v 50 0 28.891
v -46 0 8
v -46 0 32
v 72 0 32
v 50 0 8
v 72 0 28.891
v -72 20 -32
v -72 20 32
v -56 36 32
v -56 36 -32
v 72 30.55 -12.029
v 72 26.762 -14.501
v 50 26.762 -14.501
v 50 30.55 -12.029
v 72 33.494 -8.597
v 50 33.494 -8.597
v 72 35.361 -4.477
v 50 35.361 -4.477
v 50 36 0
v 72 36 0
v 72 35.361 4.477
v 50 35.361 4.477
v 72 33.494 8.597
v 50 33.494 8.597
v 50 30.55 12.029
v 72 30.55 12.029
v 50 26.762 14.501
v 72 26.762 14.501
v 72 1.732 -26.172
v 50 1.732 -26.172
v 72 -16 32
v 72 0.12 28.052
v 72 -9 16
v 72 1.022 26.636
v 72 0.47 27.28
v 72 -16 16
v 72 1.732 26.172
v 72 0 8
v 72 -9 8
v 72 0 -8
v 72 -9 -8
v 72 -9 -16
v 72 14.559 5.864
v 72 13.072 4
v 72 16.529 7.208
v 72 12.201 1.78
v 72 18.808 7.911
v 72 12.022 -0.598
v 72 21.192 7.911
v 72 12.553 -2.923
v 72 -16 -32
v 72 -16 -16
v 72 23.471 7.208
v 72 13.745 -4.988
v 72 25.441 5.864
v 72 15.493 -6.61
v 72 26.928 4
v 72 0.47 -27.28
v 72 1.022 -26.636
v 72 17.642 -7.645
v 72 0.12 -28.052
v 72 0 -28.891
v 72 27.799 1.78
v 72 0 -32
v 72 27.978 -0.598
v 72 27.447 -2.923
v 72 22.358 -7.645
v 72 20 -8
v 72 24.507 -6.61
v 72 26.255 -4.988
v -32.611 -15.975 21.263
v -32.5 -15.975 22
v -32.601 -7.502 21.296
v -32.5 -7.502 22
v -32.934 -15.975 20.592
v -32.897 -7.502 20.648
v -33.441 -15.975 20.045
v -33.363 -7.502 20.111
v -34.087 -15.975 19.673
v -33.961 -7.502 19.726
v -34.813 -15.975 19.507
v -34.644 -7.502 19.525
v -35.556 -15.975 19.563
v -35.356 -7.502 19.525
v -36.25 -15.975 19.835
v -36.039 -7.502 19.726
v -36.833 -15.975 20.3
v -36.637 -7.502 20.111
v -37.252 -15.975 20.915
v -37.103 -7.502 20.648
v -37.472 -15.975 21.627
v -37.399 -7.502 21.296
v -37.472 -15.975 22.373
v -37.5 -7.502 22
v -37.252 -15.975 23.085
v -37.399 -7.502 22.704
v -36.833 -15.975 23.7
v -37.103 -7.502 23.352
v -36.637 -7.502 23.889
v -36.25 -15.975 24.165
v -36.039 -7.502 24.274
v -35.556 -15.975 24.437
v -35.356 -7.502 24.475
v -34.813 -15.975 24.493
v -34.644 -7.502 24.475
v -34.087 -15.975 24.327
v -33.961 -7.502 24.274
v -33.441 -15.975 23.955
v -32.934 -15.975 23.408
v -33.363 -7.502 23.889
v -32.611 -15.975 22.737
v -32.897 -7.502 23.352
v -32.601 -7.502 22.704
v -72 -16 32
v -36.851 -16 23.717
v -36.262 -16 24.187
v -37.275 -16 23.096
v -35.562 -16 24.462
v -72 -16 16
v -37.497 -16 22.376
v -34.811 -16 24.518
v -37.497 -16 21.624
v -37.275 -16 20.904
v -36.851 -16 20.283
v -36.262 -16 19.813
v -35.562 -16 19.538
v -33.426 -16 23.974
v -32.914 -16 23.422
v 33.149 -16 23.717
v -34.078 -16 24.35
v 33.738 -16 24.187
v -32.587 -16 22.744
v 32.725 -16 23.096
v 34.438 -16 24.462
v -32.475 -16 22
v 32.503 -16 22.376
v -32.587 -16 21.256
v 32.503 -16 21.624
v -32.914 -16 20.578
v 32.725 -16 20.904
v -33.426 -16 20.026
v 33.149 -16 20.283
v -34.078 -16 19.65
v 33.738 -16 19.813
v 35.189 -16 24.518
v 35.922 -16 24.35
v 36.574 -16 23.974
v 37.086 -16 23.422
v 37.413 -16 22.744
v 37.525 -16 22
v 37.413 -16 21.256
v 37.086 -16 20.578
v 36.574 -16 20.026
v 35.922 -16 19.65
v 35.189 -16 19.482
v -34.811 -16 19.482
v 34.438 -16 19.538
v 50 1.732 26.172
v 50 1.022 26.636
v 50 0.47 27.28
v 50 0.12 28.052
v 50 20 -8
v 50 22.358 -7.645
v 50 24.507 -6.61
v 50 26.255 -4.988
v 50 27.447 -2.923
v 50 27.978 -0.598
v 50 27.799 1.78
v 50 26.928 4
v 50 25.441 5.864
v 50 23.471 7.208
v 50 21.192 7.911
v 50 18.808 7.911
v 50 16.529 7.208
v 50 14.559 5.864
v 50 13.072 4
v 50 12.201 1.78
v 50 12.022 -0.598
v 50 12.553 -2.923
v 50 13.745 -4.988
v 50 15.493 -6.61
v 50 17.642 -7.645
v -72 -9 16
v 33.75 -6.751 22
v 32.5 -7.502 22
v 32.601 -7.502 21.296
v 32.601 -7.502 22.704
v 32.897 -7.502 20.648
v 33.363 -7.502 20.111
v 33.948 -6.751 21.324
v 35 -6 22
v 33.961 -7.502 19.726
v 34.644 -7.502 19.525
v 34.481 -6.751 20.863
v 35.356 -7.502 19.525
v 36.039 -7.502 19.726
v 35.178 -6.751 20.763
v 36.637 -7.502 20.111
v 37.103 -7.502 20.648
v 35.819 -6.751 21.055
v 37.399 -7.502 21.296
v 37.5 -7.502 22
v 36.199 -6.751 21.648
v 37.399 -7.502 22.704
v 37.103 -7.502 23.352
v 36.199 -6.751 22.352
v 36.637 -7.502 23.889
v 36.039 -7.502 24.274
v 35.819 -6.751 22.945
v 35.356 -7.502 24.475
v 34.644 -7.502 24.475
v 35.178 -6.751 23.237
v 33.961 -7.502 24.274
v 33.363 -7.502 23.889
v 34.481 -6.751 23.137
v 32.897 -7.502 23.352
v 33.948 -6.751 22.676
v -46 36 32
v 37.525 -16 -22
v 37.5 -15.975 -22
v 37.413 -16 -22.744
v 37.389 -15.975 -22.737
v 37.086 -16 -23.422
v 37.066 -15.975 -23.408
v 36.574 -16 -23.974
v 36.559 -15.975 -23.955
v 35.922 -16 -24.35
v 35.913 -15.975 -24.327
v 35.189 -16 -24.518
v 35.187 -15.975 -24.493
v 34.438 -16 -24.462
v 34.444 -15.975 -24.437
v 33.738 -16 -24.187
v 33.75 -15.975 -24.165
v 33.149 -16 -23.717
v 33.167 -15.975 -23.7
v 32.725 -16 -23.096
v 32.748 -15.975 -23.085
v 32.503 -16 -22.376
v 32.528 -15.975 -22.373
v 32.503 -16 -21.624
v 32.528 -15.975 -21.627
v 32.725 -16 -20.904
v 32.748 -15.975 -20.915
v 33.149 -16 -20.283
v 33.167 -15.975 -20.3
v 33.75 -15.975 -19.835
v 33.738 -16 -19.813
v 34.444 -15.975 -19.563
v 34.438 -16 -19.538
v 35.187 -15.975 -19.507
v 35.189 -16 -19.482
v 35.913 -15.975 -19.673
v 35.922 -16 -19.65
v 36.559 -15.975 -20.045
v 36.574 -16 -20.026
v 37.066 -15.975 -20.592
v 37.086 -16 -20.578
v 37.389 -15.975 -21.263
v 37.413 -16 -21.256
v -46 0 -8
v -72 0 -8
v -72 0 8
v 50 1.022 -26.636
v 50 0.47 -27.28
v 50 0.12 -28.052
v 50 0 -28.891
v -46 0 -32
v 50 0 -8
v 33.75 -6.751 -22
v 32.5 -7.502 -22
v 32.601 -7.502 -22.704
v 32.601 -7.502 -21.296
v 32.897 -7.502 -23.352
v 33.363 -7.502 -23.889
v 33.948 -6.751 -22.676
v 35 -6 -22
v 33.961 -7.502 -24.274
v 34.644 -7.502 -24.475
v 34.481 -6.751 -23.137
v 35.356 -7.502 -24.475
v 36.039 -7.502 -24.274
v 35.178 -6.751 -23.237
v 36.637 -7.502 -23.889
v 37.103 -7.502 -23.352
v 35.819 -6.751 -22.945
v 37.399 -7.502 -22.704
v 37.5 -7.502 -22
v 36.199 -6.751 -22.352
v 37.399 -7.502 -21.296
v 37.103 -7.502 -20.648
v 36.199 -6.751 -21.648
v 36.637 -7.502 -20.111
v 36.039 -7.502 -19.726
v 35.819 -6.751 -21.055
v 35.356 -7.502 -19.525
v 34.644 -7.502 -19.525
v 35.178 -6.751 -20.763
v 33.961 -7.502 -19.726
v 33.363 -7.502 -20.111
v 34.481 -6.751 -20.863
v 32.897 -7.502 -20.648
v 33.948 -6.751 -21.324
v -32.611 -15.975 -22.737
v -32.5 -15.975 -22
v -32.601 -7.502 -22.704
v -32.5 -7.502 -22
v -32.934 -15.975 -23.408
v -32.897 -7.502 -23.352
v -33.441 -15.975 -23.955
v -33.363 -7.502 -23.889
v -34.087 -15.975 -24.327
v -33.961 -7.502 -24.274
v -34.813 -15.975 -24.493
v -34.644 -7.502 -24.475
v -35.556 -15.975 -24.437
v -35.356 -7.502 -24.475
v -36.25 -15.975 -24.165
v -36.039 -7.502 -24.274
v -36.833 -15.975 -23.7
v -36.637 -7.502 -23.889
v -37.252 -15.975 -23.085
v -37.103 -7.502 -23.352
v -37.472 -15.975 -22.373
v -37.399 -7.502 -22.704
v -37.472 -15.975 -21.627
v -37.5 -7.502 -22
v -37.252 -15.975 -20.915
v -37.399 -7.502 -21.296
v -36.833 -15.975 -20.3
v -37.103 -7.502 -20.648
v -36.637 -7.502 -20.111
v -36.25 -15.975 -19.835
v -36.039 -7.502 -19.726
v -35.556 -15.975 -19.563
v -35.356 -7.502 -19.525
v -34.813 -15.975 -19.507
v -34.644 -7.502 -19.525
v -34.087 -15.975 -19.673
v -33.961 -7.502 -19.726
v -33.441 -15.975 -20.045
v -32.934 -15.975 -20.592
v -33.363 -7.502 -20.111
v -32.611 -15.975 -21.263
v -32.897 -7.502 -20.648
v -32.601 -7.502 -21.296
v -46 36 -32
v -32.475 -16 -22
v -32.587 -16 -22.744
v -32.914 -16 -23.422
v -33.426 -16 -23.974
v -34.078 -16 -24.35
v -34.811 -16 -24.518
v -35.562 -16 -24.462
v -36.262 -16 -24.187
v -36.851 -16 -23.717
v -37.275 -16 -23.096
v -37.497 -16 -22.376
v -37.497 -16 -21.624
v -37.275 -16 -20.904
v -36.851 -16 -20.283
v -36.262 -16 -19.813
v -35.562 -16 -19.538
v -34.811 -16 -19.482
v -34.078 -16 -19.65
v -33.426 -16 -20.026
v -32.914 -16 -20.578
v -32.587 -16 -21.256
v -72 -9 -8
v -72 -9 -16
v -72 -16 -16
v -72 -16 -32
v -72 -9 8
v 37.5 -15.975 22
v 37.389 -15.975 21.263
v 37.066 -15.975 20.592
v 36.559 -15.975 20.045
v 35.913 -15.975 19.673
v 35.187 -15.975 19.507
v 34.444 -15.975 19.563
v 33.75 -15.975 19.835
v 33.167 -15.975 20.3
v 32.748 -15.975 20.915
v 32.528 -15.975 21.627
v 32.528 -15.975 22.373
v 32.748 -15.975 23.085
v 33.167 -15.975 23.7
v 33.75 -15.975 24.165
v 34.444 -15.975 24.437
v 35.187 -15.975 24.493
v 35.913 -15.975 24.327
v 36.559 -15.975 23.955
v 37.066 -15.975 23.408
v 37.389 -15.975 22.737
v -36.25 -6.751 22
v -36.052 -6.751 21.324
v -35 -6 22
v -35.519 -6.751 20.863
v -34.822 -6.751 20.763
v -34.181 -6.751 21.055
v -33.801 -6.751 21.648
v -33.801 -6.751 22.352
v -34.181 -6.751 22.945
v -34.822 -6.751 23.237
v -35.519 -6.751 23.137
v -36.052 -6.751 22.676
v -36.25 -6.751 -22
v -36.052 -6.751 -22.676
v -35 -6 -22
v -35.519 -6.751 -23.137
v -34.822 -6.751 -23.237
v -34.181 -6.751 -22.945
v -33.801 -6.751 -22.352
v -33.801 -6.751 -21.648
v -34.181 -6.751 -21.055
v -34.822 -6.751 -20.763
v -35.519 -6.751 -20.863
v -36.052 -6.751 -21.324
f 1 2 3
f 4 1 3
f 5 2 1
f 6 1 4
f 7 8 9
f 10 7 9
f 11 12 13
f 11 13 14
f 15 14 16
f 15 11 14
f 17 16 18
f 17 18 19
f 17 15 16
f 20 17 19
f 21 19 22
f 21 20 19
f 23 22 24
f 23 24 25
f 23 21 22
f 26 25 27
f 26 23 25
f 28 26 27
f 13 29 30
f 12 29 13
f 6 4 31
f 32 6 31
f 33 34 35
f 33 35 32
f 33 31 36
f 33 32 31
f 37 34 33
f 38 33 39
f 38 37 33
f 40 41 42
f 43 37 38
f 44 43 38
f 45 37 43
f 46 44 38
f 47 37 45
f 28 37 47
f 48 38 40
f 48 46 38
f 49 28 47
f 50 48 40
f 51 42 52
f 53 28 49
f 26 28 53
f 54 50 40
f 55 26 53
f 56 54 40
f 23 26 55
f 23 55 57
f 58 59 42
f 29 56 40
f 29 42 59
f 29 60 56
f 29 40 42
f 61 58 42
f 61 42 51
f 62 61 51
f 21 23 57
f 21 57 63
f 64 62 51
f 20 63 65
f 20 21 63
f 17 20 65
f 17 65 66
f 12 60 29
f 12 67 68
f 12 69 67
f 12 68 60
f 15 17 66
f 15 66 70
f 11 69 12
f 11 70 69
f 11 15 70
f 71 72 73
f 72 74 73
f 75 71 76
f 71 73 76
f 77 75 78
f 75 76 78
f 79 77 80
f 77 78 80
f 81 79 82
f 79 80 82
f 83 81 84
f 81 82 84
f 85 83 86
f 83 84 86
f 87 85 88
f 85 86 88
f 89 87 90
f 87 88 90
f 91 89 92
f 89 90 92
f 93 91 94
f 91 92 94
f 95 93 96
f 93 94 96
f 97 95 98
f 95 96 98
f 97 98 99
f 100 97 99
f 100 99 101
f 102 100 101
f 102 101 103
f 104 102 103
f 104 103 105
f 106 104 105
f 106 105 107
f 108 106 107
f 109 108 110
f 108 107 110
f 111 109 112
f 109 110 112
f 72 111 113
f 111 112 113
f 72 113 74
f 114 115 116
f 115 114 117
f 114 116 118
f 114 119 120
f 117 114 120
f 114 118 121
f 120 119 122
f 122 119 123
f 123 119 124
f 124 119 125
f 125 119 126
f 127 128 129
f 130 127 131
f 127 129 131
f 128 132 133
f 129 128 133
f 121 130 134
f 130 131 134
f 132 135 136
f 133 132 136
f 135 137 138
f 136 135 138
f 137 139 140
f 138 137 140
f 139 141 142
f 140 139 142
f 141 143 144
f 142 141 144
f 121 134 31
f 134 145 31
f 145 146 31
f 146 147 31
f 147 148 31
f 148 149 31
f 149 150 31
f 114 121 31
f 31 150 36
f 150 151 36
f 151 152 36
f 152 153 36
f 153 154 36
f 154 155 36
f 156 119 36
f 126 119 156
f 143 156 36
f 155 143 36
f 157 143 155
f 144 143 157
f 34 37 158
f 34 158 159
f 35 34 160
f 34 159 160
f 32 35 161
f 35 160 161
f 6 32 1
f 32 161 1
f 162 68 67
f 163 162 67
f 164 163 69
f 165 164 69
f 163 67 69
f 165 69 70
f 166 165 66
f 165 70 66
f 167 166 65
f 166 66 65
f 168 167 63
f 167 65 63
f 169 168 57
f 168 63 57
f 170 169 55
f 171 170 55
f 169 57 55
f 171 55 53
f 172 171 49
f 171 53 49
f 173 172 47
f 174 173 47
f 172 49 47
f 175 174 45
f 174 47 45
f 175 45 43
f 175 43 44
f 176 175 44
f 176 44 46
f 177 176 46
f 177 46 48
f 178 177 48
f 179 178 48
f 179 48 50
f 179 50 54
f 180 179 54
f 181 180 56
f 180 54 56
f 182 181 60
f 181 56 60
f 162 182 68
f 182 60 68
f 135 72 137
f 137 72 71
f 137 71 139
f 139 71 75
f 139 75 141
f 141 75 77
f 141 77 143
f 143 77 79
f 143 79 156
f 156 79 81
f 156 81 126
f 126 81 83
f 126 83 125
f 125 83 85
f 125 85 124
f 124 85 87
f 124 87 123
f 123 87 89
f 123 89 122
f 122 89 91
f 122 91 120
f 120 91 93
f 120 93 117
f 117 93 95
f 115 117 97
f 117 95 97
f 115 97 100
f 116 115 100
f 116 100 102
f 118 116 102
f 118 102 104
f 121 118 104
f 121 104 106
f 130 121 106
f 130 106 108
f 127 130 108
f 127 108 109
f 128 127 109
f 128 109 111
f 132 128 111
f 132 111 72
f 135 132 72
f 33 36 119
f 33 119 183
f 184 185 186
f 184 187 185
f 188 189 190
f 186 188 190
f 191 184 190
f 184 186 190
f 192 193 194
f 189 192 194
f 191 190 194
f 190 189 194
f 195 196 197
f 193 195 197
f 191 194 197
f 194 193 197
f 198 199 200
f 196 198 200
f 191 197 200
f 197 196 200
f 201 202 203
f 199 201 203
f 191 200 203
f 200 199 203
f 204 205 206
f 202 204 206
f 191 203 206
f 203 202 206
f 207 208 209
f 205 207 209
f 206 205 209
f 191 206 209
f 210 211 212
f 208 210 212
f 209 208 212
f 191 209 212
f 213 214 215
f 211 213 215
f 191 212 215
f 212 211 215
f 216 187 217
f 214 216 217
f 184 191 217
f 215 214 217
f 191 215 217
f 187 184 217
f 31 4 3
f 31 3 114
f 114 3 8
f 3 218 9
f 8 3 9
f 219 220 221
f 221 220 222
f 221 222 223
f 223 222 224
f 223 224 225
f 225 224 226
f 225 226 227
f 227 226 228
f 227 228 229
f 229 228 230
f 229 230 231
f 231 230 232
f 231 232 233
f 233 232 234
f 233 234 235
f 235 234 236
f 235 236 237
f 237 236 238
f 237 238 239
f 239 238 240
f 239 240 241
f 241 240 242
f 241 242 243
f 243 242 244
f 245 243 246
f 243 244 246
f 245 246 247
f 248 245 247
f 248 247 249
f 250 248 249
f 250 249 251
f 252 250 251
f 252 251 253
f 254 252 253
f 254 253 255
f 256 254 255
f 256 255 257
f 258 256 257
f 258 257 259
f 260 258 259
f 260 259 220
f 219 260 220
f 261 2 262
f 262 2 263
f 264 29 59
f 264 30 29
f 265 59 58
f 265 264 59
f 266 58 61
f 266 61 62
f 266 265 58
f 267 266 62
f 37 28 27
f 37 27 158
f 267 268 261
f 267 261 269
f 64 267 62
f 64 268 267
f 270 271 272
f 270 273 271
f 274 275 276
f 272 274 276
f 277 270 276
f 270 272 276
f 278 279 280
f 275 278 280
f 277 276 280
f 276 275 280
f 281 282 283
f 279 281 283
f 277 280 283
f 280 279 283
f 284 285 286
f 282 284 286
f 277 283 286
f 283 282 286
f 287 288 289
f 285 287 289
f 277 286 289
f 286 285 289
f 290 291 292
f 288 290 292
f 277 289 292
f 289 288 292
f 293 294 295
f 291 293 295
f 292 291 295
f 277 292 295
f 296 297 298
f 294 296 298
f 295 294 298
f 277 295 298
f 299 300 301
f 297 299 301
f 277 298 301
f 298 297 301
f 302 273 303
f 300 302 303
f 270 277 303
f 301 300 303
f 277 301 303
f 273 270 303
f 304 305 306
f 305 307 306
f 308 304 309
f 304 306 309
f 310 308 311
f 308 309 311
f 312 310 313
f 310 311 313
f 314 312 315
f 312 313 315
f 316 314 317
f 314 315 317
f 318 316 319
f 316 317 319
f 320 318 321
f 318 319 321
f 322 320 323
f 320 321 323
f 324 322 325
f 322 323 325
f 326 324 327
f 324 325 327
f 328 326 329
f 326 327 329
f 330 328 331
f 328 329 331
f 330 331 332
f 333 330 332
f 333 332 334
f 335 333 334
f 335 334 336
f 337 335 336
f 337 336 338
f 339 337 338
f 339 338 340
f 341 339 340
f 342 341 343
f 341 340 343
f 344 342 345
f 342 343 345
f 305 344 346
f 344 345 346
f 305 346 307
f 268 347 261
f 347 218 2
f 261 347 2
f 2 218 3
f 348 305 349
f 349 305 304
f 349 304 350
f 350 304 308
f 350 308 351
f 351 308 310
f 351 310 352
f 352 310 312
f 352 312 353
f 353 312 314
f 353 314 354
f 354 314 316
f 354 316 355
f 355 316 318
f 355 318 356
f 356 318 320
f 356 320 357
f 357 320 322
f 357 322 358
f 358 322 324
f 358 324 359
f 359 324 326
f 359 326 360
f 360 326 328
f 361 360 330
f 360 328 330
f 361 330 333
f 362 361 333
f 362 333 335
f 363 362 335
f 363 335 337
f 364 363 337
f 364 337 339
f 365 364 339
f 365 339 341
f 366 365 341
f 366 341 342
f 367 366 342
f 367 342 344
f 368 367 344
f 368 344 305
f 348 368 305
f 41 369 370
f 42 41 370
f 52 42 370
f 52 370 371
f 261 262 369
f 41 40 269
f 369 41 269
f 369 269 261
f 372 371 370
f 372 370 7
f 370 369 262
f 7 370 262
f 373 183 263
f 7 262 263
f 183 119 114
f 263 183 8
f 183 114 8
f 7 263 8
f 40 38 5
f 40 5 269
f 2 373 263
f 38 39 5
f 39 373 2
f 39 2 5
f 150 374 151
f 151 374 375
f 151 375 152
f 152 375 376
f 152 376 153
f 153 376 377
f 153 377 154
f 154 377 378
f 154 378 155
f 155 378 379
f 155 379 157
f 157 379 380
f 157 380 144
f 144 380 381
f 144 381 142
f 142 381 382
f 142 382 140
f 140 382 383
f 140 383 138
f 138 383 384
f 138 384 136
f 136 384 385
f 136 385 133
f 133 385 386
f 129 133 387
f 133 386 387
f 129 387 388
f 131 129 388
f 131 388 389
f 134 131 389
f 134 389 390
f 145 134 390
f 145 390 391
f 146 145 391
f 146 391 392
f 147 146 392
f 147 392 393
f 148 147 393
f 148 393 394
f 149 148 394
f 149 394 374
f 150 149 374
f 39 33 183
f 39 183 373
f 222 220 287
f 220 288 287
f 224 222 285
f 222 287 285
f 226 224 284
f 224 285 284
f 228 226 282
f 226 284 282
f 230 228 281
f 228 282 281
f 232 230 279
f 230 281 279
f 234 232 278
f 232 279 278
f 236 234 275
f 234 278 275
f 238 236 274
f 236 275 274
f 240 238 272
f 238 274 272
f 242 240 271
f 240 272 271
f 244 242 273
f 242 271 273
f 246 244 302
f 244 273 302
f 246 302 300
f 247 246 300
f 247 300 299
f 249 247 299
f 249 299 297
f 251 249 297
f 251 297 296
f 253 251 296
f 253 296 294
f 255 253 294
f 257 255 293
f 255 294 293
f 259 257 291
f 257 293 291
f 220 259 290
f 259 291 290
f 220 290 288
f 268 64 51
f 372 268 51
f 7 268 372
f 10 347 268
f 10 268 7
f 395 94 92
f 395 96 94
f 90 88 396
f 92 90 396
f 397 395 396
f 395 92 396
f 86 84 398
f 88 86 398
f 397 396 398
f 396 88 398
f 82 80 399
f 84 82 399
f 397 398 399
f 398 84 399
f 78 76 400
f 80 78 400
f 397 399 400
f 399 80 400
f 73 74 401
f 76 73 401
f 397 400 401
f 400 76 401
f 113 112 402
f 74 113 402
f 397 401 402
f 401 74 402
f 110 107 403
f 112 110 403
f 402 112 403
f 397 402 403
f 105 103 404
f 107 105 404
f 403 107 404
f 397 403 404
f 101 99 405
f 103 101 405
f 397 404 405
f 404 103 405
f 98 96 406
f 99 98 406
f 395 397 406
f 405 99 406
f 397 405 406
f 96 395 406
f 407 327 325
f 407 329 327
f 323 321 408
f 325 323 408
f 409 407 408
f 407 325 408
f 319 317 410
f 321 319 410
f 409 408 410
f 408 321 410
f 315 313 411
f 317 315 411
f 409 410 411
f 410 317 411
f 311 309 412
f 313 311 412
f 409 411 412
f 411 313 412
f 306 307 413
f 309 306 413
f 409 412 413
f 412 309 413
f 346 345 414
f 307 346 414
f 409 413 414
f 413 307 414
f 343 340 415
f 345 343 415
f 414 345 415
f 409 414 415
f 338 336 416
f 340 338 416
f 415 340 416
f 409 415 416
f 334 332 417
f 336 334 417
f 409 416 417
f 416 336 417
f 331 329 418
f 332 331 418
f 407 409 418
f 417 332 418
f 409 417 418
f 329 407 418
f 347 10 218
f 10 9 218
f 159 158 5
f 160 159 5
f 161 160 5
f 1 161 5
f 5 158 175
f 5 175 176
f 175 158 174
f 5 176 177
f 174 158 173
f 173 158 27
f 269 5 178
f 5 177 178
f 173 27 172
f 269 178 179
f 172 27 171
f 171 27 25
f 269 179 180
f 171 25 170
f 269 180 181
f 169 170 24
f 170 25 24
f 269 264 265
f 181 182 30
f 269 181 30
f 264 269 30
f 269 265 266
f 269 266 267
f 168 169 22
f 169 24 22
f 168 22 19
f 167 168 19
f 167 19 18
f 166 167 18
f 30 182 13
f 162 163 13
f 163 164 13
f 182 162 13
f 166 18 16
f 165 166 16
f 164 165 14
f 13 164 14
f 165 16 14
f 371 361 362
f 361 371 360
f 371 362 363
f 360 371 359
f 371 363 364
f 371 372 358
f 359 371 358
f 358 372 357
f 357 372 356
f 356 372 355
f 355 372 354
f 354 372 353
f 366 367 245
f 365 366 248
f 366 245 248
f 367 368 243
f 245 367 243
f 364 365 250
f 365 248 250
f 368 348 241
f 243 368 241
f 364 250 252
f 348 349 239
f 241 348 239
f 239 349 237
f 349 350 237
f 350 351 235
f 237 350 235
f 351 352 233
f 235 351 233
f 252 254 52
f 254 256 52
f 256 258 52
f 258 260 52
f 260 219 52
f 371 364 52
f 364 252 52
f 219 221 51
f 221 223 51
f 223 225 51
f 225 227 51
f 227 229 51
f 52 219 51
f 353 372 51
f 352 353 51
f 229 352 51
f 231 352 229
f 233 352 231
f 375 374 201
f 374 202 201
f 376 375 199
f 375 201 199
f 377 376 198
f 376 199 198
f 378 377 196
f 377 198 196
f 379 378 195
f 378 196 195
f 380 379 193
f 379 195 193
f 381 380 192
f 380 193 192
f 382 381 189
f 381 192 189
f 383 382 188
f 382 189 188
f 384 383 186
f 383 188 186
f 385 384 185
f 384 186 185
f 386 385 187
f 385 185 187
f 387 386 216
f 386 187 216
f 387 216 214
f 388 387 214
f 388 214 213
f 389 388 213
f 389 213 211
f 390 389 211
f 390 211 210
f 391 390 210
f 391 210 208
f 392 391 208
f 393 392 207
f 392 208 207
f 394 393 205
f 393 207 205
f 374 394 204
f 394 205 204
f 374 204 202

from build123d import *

# Parameters (mm, degrees)
SKETCH1_W                             = 144
SKETCH1_H                             = 64
BOSS_EXTRUDE1_DEPTH                   = 16
CUT_EXTRUDE1_REACH                    = 146
BOSS_EXTRUDE2_DEPTH                   = 32
SKETCH5_R                             = 8
BOSS_EXTRUDE3_DEPTH                   = 22
FILLET1_R                             = 3
TAP_DRILL_FOR_M6X1_0_TAP1_D           = 5
TAP_DRILL_FOR_M6X1_0_TAP1_DEPTH       = 8.497848452
TAP_DRILL_FOR_M6X1_0_TAP1_CSINK_D     = 5.05
TAP_DRILL_FOR_M6X1_0_TAP1_CSINK_ANGLE = 90
TAP_DRILL_FOR_M6X1_0_TAP1_TIP         = 1.502151548


with BuildPart() as part:
    # Sketch1 → Boss-Extrude1 (new body)
    with BuildSketch(Plane(origin=(0, 0, 0), x_dir=(1, 0, 0), z_dir=(0, 1, 0))):
        Rectangle(SKETCH1_W, SKETCH1_H)
    extrude(amount=-BOSS_EXTRUDE1_DEPTH)

    # Sketch2 → Cut-Extrude1 (cut, up to next)
    with BuildSketch(Plane(origin=(72, 0, 0), x_dir=(0, 0, -1), z_dir=(1, 0, 0)), mode=Mode.PRIVATE) as cut_extrude1_sk1:
        Polygon((-8, 0), (8, 0), (8, -9), (16, -9), (16, -16), (-16, -16), (-16, -9), (-8, -9), align=None)
    cut_extrude1_tool1 = extrude(cut_extrude1_sk1.sketch, amount=-CUT_EXTRUDE1_REACH, mode=Mode.PRIVATE) & part.part
    add(cut_extrude1_tool1.solids().sort_by_distance((72, -9.369565, 0))[0], mode=Mode.SUBTRACT)

    # Sketch4 → Boss-Extrude2 (add, symmetric)
    with BuildSketch(Plane.XY):
        Polygon((-72, 20), (-56, 36), (-46, 36), (-46, 0), (-72, 0), align=None)
    extrude(amount=BOSS_EXTRUDE2_DEPTH, both=True)

    # Sketch5 → Boss-Extrude3 (add)
    with BuildSketch(Plane(origin=(72, 0, 0), x_dir=(0, 0, -1), z_dir=(1, 0, 0))):
        with BuildLine():
            Line((26.980199866, 0), (14.500924593, 26.761892188))
            ThreePointArc((14.500924593, 26.761892188), (0, 36), (-14.500924593, 26.761892188))
            Line((-14.500924593, 26.761892188), (-26.980199866, 0))
            Line((-26.980199866, 0), (26.980199866, 0))
        make_face()
        with Locations((0, 20)):
            Circle(SKETCH5_R, mode=Mode.SUBTRACT)
    extrude(amount=-BOSS_EXTRUDE3_DEPTH)

    # Fillet1
    fillet1_edges = [part.edges().sort_by_distance(p)[0] for p in [
        (61, 0, -26.980199866),
        (61, 0, 26.980199866),
    ]]
    fillet(fillet1_edges, radius=FILLET1_R)

    # Tap Drill for M6x1.0 Tap1
    with Locations(Plane(origin=(0, -16, 0), x_dir=(-1, 0, 0), z_dir=(0, -1, 0))):
        with Locations((35, 22), (-35, 22), (35, -22), (-35, -22), (0, 0)):
            CounterSinkHole(TAP_DRILL_FOR_M6X1_0_TAP1_D / 2, TAP_DRILL_FOR_M6X1_0_TAP1_CSINK_D / 2, depth=TAP_DRILL_FOR_M6X1_0_TAP1_DEPTH, counter_sink_angle=TAP_DRILL_FOR_M6X1_0_TAP1_CSINK_ANGLE)
            with Locations((0, 0, -(TAP_DRILL_FOR_M6X1_0_TAP1_DEPTH + TAP_DRILL_FOR_M6X1_0_TAP1_TIP / 2))):  # 118° drill point
                Cone(0, TAP_DRILL_FOR_M6X1_0_TAP1_D / 2, TAP_DRILL_FOR_M6X1_0_TAP1_TIP, mode=Mode.SUBTRACT)


solid = part.part
